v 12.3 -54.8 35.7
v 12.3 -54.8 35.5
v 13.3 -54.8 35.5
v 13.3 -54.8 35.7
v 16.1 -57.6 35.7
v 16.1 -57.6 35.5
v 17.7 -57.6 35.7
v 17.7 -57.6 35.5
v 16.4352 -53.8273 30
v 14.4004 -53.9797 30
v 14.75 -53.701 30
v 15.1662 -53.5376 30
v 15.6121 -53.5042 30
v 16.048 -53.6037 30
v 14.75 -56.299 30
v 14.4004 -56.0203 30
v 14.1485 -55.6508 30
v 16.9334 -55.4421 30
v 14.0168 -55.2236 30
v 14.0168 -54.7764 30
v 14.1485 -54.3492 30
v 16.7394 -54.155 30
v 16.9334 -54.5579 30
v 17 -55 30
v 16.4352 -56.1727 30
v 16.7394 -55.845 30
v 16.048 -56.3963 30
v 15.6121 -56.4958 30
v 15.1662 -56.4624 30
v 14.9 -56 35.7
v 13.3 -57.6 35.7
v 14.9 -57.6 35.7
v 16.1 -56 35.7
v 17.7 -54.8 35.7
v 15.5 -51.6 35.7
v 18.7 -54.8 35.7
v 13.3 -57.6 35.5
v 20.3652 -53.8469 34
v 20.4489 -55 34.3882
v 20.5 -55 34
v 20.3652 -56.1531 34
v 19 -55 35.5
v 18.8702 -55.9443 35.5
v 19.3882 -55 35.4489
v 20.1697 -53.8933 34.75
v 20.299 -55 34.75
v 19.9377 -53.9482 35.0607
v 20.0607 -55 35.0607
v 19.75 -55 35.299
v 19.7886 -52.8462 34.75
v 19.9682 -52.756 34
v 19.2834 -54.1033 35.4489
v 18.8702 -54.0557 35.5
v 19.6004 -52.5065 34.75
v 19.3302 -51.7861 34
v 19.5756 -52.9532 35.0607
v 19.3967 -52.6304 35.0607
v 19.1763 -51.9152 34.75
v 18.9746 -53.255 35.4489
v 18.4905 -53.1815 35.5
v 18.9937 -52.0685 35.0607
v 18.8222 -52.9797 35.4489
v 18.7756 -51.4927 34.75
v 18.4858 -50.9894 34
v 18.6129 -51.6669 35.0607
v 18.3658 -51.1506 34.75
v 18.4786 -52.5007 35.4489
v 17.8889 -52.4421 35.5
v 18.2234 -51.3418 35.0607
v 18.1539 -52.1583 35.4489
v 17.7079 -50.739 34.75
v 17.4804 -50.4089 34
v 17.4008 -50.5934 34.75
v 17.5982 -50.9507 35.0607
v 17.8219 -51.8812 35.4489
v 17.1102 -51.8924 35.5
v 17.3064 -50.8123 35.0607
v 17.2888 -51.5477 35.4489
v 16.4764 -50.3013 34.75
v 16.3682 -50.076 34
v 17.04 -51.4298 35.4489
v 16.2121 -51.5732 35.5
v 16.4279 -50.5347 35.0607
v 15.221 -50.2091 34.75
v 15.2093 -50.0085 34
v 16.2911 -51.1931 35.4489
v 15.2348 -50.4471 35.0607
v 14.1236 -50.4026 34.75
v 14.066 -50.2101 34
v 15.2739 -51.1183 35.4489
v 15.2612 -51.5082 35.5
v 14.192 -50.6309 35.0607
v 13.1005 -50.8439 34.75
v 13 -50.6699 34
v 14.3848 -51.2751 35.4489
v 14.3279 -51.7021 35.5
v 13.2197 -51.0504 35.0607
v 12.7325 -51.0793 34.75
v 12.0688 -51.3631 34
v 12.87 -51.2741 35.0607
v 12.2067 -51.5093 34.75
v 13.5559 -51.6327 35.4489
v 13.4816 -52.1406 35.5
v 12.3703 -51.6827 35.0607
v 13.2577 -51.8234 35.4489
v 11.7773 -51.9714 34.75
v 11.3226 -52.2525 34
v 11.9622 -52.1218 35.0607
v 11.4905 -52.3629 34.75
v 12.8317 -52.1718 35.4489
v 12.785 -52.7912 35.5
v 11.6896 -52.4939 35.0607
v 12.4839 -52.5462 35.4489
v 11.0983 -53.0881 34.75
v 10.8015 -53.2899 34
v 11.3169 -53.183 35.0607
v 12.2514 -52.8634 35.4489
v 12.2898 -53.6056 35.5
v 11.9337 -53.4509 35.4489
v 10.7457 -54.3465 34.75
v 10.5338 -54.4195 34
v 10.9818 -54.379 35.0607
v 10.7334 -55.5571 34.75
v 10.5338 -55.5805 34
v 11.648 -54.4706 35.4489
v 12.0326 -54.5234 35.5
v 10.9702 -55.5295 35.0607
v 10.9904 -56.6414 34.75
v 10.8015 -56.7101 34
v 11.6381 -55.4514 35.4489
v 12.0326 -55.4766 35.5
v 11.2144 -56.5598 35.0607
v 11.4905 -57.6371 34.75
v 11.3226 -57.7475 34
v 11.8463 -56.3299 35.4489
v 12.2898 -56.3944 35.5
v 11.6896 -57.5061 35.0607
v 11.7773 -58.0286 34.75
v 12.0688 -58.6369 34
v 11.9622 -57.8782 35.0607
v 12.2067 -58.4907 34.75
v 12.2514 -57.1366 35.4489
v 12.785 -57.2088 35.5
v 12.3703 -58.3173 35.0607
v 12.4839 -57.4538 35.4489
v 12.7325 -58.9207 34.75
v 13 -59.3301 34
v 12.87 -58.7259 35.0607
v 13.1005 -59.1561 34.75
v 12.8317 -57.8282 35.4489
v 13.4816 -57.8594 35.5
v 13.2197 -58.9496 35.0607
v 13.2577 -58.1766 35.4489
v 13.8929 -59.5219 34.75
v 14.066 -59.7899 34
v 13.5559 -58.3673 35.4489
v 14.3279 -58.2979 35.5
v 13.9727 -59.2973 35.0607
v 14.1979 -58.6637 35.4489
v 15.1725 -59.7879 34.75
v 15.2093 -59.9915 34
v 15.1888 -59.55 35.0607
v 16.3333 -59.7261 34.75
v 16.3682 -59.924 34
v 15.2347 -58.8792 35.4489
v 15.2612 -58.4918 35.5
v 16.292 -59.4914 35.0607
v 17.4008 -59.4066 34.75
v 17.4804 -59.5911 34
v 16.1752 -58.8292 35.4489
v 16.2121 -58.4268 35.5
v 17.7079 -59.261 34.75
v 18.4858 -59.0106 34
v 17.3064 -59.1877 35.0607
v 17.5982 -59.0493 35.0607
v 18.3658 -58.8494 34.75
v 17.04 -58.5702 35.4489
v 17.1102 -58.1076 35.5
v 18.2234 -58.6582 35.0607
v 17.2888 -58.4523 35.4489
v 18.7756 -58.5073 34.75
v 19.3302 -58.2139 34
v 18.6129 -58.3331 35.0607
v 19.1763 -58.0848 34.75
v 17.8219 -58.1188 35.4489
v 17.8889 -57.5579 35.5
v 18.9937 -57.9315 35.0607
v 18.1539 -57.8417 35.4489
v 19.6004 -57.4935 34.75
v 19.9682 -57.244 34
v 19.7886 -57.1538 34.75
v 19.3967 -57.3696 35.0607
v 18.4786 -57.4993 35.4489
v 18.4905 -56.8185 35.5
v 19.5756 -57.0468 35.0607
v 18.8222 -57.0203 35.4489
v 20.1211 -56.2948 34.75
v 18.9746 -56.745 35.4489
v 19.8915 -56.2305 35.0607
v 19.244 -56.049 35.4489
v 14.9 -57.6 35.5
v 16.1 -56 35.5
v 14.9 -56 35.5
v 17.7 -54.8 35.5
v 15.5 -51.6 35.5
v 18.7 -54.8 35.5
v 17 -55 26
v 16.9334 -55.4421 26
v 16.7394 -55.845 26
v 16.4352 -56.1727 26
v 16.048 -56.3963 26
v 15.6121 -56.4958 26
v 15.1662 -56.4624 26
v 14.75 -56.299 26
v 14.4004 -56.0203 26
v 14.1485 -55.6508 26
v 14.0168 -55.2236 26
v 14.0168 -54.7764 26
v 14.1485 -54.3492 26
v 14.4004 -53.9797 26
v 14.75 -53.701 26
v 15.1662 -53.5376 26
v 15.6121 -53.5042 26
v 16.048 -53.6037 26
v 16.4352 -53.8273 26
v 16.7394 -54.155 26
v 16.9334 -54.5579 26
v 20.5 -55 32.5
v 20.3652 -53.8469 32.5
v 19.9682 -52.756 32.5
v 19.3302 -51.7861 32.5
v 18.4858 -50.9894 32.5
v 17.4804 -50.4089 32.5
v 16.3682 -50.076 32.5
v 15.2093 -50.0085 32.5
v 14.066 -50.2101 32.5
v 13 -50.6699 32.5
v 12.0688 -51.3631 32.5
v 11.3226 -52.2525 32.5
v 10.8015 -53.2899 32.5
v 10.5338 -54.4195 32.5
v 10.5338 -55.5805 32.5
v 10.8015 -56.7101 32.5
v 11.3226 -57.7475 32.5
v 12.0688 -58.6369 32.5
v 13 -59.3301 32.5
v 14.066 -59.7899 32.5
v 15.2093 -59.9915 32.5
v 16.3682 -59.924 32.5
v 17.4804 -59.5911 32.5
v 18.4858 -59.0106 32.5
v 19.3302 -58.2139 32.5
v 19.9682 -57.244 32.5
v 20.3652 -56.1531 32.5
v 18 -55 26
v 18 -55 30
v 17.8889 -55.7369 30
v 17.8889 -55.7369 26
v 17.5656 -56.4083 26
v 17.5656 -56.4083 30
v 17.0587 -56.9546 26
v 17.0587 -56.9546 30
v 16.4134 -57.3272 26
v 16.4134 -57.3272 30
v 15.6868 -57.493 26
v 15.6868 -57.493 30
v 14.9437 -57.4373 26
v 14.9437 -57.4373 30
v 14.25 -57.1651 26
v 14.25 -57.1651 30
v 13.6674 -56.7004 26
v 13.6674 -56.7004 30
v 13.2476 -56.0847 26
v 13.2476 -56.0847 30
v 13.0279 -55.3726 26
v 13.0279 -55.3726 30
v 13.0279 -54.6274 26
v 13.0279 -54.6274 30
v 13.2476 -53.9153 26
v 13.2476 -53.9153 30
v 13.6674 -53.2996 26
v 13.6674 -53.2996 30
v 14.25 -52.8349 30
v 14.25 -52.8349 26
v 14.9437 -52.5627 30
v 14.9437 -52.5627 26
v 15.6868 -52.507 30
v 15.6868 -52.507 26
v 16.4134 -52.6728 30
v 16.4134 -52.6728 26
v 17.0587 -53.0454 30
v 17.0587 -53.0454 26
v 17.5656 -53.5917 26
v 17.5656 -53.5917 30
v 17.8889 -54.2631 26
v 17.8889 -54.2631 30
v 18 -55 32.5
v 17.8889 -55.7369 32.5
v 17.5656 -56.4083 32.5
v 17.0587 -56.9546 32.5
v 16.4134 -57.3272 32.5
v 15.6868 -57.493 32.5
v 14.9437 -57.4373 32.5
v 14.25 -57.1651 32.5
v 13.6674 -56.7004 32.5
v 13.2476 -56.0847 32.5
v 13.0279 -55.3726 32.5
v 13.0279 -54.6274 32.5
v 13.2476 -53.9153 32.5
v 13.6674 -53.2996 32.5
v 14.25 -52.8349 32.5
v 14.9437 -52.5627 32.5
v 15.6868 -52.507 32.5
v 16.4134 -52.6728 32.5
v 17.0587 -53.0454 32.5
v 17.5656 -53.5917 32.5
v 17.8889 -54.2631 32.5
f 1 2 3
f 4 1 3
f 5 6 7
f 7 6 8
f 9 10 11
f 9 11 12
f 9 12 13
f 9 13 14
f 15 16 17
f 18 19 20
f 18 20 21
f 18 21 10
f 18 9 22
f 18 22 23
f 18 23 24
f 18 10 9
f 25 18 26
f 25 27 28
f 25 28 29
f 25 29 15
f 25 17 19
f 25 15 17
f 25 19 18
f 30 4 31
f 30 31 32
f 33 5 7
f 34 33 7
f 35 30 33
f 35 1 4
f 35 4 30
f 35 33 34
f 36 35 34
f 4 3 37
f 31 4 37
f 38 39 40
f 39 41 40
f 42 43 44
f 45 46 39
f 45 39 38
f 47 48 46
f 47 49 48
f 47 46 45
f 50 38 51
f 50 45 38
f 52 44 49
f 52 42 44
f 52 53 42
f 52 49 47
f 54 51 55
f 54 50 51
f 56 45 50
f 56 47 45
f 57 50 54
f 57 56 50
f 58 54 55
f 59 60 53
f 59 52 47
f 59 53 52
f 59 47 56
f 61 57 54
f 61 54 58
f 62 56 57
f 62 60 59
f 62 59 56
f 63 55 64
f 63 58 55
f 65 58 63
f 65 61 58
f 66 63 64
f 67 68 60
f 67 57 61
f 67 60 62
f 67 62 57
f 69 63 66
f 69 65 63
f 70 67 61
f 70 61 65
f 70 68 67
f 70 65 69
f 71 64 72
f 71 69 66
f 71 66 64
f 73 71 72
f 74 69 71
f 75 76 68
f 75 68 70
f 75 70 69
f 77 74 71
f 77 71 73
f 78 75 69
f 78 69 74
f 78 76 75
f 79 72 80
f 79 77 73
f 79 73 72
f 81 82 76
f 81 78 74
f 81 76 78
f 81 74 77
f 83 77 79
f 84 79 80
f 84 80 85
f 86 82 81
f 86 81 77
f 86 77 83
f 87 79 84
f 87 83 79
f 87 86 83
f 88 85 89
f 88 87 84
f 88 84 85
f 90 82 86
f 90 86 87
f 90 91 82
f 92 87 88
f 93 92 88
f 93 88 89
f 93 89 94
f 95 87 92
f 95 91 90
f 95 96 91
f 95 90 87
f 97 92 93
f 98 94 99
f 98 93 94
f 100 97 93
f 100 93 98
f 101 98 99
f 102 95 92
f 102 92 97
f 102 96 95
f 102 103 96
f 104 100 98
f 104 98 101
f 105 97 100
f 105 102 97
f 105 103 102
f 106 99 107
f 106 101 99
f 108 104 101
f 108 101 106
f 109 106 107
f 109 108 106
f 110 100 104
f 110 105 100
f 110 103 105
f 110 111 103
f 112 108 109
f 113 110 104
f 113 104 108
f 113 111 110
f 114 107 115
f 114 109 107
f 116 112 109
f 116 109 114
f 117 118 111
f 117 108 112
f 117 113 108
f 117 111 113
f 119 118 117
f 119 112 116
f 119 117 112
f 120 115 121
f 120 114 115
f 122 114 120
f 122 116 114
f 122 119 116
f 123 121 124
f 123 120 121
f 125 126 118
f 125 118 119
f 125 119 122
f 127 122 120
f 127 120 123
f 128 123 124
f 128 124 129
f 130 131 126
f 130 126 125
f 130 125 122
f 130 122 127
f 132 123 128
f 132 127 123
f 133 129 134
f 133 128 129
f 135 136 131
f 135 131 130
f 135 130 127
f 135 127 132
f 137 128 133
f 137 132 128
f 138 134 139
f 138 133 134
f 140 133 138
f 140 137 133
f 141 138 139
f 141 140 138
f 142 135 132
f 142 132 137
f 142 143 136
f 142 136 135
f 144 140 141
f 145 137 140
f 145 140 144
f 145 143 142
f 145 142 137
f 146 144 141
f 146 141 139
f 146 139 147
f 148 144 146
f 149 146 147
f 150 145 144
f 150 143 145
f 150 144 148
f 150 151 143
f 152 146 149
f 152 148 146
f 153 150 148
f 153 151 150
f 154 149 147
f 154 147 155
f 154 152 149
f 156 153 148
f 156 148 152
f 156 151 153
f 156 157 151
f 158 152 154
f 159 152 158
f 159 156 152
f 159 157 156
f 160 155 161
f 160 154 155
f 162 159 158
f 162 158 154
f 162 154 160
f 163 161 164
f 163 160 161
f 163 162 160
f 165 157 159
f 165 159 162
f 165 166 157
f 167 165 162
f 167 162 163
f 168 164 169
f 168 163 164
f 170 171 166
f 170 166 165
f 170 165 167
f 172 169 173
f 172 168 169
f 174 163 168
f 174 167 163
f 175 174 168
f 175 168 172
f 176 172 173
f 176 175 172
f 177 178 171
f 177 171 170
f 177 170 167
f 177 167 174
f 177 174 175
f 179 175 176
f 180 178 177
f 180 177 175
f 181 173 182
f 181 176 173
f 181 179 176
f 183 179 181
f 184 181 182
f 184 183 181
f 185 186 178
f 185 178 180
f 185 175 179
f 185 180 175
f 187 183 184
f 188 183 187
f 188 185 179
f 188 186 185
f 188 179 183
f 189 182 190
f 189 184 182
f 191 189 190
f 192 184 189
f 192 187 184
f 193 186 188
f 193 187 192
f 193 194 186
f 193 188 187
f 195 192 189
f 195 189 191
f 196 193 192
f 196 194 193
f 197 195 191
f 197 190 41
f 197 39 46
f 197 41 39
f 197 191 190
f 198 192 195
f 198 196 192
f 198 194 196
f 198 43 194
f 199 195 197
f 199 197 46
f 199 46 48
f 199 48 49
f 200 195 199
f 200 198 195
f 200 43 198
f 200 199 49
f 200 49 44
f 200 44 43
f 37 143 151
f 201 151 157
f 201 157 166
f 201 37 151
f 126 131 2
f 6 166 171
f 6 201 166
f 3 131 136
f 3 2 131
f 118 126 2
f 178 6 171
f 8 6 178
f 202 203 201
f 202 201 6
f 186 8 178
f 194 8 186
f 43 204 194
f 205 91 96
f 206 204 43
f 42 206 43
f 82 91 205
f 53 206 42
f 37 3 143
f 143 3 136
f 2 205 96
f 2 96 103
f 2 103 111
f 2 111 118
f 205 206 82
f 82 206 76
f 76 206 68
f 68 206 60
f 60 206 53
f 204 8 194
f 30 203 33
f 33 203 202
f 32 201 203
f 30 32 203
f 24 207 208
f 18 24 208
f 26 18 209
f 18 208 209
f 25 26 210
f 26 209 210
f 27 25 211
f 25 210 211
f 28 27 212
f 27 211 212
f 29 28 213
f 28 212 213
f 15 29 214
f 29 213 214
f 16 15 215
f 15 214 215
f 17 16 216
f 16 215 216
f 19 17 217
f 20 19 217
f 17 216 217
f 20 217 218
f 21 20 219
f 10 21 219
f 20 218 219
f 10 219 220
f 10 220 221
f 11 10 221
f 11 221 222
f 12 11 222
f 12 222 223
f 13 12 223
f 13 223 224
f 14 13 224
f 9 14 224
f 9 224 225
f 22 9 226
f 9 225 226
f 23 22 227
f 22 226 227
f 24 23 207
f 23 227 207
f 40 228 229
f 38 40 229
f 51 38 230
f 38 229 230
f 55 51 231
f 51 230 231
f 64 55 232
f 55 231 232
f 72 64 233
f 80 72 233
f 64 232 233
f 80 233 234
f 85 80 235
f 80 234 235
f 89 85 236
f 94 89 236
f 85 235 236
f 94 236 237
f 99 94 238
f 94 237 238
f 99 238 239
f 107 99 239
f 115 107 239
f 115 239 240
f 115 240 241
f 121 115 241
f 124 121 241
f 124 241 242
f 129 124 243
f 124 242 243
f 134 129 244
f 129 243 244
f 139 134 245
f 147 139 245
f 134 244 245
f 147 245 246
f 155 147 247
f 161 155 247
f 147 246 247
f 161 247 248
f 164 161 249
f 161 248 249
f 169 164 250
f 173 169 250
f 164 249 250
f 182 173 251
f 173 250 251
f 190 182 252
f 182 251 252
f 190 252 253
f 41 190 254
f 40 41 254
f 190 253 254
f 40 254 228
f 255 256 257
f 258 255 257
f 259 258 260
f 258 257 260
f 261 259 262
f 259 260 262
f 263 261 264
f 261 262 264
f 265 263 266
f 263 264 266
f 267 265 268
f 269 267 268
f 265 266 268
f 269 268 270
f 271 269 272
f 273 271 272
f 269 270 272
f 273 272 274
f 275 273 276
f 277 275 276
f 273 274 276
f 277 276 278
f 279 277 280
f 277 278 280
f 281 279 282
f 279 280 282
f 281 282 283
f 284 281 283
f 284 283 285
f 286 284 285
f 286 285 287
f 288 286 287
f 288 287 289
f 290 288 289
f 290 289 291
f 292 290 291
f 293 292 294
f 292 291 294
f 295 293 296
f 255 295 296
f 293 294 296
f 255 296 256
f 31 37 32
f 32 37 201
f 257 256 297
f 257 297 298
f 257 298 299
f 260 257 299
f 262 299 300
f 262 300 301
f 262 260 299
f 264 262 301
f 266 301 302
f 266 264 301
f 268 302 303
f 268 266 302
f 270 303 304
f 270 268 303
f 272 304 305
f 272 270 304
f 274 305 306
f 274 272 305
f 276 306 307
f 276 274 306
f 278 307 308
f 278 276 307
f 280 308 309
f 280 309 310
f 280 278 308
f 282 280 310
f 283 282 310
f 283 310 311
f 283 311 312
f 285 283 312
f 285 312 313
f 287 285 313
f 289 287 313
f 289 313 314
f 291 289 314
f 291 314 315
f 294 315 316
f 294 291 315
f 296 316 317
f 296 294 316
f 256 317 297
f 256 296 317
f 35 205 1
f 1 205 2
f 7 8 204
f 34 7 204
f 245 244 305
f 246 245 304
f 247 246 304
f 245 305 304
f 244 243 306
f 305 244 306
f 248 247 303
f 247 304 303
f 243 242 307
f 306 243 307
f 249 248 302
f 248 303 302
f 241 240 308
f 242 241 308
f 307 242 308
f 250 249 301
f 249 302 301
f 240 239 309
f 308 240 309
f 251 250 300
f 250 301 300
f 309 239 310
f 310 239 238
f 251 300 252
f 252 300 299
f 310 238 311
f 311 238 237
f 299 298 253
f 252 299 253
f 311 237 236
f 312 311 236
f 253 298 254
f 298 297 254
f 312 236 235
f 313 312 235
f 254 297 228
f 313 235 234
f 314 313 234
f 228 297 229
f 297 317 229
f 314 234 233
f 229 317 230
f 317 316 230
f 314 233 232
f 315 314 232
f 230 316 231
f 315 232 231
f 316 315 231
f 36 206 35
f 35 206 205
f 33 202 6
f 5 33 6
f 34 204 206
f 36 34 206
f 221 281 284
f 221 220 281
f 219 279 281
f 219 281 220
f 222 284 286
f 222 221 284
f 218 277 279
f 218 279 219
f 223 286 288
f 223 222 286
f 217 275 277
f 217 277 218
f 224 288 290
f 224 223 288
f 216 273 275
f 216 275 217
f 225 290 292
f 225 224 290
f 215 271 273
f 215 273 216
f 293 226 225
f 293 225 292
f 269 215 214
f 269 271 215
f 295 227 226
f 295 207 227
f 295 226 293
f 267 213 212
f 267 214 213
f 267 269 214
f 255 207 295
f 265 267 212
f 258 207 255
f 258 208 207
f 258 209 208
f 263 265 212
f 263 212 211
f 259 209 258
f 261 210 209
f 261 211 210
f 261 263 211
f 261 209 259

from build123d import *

# Parameters (mm, degrees)
SKETCH046_R     = 2.5
PAD023_DEPTH    = 2.5
SKETCH047_R     = 5
PAD024_DEPTH    = 3
FILLET003_R     = 1.5
SKETCH049_R     = 2.5
PAD025_DEPTH    = 4
SKETCH050_R     = 1.5
POCKET026_DEPTH = 4
PAD051_DEPTH    = 0.2


with BuildPart() as part:
    # Sketch046 → Pad023 (new body)
    with BuildSketch(Plane(origin=(0, 0, 30), x_dir=(1, 0, 0), z_dir=(0, 0, -1))):
        with Locations((101, 55)):
            Circle(SKETCH046_R)
    extrude(amount=-PAD023_DEPTH)

    # Sketch047 (on Face3 of Pad023) → Pad024 (join)
    with BuildSketch(Plane.XY.offset(32.5)):
        with Locations((101, -55)):
            Circle(SKETCH047_R)
    extrude(amount=PAD024_DEPTH)

    # Fillet003
    fillet003_edges = [part.edges().sort_by_distance(p)[0] for p in [
        (96, -55, 35.5),
    ]]
    fillet(fillet003_edges, radius=FILLET003_R)

    # Sketch049 → Pad025 (join)
    with BuildSketch(Plane(origin=(0, 0, 30), x_dir=(1, 0, 0), z_dir=(0, 0, -1))):
        with Locations((101, 55)):
            Circle(SKETCH049_R)
    extrude(amount=PAD025_DEPTH)

    # Sketch050 (on Face17 of Pad025) → Pocket026 (cut)
    with BuildSketch(Plane(origin=(0, 0, 26), x_dir=(1, 0, 0), z_dir=(0, 0, -1))):
        with Locations((101, 55)):
            Circle(SKETCH050_R)
    extrude(amount=-POCKET026_DEPTH, mode=Mode.SUBTRACT)


with BuildPart() as part_1:
    # Body002 placement: moved
    add(part.part.moved(Location((75, 0, 0))))

    # Sketch085 (on Face4 of Clone003) → Pad051 (new body)
    with BuildSketch(Plane(origin=(176, -55, 35.5), x_dir=(1, 0, 0), z_dir=(0, 0, 1))):
        Polygon((-0.6, -2.6), (-0.6, -1), (0.6, -1), (0.6, -2.6), (2.2, -2.6), (2.2, 0.2), (3.2, 0.2), (0, 3.4), (-3.2, 0.2), (-2.2, 0.2), (-2.2, -2.6), align=None)
    extrude(amount=PAD051_DEPTH)


with BuildPart() as part_2:
    # Body009 placement: moved
    add(part_1.part.moved(Location((-160.5, 0, 0))))


solid = part_2.part
